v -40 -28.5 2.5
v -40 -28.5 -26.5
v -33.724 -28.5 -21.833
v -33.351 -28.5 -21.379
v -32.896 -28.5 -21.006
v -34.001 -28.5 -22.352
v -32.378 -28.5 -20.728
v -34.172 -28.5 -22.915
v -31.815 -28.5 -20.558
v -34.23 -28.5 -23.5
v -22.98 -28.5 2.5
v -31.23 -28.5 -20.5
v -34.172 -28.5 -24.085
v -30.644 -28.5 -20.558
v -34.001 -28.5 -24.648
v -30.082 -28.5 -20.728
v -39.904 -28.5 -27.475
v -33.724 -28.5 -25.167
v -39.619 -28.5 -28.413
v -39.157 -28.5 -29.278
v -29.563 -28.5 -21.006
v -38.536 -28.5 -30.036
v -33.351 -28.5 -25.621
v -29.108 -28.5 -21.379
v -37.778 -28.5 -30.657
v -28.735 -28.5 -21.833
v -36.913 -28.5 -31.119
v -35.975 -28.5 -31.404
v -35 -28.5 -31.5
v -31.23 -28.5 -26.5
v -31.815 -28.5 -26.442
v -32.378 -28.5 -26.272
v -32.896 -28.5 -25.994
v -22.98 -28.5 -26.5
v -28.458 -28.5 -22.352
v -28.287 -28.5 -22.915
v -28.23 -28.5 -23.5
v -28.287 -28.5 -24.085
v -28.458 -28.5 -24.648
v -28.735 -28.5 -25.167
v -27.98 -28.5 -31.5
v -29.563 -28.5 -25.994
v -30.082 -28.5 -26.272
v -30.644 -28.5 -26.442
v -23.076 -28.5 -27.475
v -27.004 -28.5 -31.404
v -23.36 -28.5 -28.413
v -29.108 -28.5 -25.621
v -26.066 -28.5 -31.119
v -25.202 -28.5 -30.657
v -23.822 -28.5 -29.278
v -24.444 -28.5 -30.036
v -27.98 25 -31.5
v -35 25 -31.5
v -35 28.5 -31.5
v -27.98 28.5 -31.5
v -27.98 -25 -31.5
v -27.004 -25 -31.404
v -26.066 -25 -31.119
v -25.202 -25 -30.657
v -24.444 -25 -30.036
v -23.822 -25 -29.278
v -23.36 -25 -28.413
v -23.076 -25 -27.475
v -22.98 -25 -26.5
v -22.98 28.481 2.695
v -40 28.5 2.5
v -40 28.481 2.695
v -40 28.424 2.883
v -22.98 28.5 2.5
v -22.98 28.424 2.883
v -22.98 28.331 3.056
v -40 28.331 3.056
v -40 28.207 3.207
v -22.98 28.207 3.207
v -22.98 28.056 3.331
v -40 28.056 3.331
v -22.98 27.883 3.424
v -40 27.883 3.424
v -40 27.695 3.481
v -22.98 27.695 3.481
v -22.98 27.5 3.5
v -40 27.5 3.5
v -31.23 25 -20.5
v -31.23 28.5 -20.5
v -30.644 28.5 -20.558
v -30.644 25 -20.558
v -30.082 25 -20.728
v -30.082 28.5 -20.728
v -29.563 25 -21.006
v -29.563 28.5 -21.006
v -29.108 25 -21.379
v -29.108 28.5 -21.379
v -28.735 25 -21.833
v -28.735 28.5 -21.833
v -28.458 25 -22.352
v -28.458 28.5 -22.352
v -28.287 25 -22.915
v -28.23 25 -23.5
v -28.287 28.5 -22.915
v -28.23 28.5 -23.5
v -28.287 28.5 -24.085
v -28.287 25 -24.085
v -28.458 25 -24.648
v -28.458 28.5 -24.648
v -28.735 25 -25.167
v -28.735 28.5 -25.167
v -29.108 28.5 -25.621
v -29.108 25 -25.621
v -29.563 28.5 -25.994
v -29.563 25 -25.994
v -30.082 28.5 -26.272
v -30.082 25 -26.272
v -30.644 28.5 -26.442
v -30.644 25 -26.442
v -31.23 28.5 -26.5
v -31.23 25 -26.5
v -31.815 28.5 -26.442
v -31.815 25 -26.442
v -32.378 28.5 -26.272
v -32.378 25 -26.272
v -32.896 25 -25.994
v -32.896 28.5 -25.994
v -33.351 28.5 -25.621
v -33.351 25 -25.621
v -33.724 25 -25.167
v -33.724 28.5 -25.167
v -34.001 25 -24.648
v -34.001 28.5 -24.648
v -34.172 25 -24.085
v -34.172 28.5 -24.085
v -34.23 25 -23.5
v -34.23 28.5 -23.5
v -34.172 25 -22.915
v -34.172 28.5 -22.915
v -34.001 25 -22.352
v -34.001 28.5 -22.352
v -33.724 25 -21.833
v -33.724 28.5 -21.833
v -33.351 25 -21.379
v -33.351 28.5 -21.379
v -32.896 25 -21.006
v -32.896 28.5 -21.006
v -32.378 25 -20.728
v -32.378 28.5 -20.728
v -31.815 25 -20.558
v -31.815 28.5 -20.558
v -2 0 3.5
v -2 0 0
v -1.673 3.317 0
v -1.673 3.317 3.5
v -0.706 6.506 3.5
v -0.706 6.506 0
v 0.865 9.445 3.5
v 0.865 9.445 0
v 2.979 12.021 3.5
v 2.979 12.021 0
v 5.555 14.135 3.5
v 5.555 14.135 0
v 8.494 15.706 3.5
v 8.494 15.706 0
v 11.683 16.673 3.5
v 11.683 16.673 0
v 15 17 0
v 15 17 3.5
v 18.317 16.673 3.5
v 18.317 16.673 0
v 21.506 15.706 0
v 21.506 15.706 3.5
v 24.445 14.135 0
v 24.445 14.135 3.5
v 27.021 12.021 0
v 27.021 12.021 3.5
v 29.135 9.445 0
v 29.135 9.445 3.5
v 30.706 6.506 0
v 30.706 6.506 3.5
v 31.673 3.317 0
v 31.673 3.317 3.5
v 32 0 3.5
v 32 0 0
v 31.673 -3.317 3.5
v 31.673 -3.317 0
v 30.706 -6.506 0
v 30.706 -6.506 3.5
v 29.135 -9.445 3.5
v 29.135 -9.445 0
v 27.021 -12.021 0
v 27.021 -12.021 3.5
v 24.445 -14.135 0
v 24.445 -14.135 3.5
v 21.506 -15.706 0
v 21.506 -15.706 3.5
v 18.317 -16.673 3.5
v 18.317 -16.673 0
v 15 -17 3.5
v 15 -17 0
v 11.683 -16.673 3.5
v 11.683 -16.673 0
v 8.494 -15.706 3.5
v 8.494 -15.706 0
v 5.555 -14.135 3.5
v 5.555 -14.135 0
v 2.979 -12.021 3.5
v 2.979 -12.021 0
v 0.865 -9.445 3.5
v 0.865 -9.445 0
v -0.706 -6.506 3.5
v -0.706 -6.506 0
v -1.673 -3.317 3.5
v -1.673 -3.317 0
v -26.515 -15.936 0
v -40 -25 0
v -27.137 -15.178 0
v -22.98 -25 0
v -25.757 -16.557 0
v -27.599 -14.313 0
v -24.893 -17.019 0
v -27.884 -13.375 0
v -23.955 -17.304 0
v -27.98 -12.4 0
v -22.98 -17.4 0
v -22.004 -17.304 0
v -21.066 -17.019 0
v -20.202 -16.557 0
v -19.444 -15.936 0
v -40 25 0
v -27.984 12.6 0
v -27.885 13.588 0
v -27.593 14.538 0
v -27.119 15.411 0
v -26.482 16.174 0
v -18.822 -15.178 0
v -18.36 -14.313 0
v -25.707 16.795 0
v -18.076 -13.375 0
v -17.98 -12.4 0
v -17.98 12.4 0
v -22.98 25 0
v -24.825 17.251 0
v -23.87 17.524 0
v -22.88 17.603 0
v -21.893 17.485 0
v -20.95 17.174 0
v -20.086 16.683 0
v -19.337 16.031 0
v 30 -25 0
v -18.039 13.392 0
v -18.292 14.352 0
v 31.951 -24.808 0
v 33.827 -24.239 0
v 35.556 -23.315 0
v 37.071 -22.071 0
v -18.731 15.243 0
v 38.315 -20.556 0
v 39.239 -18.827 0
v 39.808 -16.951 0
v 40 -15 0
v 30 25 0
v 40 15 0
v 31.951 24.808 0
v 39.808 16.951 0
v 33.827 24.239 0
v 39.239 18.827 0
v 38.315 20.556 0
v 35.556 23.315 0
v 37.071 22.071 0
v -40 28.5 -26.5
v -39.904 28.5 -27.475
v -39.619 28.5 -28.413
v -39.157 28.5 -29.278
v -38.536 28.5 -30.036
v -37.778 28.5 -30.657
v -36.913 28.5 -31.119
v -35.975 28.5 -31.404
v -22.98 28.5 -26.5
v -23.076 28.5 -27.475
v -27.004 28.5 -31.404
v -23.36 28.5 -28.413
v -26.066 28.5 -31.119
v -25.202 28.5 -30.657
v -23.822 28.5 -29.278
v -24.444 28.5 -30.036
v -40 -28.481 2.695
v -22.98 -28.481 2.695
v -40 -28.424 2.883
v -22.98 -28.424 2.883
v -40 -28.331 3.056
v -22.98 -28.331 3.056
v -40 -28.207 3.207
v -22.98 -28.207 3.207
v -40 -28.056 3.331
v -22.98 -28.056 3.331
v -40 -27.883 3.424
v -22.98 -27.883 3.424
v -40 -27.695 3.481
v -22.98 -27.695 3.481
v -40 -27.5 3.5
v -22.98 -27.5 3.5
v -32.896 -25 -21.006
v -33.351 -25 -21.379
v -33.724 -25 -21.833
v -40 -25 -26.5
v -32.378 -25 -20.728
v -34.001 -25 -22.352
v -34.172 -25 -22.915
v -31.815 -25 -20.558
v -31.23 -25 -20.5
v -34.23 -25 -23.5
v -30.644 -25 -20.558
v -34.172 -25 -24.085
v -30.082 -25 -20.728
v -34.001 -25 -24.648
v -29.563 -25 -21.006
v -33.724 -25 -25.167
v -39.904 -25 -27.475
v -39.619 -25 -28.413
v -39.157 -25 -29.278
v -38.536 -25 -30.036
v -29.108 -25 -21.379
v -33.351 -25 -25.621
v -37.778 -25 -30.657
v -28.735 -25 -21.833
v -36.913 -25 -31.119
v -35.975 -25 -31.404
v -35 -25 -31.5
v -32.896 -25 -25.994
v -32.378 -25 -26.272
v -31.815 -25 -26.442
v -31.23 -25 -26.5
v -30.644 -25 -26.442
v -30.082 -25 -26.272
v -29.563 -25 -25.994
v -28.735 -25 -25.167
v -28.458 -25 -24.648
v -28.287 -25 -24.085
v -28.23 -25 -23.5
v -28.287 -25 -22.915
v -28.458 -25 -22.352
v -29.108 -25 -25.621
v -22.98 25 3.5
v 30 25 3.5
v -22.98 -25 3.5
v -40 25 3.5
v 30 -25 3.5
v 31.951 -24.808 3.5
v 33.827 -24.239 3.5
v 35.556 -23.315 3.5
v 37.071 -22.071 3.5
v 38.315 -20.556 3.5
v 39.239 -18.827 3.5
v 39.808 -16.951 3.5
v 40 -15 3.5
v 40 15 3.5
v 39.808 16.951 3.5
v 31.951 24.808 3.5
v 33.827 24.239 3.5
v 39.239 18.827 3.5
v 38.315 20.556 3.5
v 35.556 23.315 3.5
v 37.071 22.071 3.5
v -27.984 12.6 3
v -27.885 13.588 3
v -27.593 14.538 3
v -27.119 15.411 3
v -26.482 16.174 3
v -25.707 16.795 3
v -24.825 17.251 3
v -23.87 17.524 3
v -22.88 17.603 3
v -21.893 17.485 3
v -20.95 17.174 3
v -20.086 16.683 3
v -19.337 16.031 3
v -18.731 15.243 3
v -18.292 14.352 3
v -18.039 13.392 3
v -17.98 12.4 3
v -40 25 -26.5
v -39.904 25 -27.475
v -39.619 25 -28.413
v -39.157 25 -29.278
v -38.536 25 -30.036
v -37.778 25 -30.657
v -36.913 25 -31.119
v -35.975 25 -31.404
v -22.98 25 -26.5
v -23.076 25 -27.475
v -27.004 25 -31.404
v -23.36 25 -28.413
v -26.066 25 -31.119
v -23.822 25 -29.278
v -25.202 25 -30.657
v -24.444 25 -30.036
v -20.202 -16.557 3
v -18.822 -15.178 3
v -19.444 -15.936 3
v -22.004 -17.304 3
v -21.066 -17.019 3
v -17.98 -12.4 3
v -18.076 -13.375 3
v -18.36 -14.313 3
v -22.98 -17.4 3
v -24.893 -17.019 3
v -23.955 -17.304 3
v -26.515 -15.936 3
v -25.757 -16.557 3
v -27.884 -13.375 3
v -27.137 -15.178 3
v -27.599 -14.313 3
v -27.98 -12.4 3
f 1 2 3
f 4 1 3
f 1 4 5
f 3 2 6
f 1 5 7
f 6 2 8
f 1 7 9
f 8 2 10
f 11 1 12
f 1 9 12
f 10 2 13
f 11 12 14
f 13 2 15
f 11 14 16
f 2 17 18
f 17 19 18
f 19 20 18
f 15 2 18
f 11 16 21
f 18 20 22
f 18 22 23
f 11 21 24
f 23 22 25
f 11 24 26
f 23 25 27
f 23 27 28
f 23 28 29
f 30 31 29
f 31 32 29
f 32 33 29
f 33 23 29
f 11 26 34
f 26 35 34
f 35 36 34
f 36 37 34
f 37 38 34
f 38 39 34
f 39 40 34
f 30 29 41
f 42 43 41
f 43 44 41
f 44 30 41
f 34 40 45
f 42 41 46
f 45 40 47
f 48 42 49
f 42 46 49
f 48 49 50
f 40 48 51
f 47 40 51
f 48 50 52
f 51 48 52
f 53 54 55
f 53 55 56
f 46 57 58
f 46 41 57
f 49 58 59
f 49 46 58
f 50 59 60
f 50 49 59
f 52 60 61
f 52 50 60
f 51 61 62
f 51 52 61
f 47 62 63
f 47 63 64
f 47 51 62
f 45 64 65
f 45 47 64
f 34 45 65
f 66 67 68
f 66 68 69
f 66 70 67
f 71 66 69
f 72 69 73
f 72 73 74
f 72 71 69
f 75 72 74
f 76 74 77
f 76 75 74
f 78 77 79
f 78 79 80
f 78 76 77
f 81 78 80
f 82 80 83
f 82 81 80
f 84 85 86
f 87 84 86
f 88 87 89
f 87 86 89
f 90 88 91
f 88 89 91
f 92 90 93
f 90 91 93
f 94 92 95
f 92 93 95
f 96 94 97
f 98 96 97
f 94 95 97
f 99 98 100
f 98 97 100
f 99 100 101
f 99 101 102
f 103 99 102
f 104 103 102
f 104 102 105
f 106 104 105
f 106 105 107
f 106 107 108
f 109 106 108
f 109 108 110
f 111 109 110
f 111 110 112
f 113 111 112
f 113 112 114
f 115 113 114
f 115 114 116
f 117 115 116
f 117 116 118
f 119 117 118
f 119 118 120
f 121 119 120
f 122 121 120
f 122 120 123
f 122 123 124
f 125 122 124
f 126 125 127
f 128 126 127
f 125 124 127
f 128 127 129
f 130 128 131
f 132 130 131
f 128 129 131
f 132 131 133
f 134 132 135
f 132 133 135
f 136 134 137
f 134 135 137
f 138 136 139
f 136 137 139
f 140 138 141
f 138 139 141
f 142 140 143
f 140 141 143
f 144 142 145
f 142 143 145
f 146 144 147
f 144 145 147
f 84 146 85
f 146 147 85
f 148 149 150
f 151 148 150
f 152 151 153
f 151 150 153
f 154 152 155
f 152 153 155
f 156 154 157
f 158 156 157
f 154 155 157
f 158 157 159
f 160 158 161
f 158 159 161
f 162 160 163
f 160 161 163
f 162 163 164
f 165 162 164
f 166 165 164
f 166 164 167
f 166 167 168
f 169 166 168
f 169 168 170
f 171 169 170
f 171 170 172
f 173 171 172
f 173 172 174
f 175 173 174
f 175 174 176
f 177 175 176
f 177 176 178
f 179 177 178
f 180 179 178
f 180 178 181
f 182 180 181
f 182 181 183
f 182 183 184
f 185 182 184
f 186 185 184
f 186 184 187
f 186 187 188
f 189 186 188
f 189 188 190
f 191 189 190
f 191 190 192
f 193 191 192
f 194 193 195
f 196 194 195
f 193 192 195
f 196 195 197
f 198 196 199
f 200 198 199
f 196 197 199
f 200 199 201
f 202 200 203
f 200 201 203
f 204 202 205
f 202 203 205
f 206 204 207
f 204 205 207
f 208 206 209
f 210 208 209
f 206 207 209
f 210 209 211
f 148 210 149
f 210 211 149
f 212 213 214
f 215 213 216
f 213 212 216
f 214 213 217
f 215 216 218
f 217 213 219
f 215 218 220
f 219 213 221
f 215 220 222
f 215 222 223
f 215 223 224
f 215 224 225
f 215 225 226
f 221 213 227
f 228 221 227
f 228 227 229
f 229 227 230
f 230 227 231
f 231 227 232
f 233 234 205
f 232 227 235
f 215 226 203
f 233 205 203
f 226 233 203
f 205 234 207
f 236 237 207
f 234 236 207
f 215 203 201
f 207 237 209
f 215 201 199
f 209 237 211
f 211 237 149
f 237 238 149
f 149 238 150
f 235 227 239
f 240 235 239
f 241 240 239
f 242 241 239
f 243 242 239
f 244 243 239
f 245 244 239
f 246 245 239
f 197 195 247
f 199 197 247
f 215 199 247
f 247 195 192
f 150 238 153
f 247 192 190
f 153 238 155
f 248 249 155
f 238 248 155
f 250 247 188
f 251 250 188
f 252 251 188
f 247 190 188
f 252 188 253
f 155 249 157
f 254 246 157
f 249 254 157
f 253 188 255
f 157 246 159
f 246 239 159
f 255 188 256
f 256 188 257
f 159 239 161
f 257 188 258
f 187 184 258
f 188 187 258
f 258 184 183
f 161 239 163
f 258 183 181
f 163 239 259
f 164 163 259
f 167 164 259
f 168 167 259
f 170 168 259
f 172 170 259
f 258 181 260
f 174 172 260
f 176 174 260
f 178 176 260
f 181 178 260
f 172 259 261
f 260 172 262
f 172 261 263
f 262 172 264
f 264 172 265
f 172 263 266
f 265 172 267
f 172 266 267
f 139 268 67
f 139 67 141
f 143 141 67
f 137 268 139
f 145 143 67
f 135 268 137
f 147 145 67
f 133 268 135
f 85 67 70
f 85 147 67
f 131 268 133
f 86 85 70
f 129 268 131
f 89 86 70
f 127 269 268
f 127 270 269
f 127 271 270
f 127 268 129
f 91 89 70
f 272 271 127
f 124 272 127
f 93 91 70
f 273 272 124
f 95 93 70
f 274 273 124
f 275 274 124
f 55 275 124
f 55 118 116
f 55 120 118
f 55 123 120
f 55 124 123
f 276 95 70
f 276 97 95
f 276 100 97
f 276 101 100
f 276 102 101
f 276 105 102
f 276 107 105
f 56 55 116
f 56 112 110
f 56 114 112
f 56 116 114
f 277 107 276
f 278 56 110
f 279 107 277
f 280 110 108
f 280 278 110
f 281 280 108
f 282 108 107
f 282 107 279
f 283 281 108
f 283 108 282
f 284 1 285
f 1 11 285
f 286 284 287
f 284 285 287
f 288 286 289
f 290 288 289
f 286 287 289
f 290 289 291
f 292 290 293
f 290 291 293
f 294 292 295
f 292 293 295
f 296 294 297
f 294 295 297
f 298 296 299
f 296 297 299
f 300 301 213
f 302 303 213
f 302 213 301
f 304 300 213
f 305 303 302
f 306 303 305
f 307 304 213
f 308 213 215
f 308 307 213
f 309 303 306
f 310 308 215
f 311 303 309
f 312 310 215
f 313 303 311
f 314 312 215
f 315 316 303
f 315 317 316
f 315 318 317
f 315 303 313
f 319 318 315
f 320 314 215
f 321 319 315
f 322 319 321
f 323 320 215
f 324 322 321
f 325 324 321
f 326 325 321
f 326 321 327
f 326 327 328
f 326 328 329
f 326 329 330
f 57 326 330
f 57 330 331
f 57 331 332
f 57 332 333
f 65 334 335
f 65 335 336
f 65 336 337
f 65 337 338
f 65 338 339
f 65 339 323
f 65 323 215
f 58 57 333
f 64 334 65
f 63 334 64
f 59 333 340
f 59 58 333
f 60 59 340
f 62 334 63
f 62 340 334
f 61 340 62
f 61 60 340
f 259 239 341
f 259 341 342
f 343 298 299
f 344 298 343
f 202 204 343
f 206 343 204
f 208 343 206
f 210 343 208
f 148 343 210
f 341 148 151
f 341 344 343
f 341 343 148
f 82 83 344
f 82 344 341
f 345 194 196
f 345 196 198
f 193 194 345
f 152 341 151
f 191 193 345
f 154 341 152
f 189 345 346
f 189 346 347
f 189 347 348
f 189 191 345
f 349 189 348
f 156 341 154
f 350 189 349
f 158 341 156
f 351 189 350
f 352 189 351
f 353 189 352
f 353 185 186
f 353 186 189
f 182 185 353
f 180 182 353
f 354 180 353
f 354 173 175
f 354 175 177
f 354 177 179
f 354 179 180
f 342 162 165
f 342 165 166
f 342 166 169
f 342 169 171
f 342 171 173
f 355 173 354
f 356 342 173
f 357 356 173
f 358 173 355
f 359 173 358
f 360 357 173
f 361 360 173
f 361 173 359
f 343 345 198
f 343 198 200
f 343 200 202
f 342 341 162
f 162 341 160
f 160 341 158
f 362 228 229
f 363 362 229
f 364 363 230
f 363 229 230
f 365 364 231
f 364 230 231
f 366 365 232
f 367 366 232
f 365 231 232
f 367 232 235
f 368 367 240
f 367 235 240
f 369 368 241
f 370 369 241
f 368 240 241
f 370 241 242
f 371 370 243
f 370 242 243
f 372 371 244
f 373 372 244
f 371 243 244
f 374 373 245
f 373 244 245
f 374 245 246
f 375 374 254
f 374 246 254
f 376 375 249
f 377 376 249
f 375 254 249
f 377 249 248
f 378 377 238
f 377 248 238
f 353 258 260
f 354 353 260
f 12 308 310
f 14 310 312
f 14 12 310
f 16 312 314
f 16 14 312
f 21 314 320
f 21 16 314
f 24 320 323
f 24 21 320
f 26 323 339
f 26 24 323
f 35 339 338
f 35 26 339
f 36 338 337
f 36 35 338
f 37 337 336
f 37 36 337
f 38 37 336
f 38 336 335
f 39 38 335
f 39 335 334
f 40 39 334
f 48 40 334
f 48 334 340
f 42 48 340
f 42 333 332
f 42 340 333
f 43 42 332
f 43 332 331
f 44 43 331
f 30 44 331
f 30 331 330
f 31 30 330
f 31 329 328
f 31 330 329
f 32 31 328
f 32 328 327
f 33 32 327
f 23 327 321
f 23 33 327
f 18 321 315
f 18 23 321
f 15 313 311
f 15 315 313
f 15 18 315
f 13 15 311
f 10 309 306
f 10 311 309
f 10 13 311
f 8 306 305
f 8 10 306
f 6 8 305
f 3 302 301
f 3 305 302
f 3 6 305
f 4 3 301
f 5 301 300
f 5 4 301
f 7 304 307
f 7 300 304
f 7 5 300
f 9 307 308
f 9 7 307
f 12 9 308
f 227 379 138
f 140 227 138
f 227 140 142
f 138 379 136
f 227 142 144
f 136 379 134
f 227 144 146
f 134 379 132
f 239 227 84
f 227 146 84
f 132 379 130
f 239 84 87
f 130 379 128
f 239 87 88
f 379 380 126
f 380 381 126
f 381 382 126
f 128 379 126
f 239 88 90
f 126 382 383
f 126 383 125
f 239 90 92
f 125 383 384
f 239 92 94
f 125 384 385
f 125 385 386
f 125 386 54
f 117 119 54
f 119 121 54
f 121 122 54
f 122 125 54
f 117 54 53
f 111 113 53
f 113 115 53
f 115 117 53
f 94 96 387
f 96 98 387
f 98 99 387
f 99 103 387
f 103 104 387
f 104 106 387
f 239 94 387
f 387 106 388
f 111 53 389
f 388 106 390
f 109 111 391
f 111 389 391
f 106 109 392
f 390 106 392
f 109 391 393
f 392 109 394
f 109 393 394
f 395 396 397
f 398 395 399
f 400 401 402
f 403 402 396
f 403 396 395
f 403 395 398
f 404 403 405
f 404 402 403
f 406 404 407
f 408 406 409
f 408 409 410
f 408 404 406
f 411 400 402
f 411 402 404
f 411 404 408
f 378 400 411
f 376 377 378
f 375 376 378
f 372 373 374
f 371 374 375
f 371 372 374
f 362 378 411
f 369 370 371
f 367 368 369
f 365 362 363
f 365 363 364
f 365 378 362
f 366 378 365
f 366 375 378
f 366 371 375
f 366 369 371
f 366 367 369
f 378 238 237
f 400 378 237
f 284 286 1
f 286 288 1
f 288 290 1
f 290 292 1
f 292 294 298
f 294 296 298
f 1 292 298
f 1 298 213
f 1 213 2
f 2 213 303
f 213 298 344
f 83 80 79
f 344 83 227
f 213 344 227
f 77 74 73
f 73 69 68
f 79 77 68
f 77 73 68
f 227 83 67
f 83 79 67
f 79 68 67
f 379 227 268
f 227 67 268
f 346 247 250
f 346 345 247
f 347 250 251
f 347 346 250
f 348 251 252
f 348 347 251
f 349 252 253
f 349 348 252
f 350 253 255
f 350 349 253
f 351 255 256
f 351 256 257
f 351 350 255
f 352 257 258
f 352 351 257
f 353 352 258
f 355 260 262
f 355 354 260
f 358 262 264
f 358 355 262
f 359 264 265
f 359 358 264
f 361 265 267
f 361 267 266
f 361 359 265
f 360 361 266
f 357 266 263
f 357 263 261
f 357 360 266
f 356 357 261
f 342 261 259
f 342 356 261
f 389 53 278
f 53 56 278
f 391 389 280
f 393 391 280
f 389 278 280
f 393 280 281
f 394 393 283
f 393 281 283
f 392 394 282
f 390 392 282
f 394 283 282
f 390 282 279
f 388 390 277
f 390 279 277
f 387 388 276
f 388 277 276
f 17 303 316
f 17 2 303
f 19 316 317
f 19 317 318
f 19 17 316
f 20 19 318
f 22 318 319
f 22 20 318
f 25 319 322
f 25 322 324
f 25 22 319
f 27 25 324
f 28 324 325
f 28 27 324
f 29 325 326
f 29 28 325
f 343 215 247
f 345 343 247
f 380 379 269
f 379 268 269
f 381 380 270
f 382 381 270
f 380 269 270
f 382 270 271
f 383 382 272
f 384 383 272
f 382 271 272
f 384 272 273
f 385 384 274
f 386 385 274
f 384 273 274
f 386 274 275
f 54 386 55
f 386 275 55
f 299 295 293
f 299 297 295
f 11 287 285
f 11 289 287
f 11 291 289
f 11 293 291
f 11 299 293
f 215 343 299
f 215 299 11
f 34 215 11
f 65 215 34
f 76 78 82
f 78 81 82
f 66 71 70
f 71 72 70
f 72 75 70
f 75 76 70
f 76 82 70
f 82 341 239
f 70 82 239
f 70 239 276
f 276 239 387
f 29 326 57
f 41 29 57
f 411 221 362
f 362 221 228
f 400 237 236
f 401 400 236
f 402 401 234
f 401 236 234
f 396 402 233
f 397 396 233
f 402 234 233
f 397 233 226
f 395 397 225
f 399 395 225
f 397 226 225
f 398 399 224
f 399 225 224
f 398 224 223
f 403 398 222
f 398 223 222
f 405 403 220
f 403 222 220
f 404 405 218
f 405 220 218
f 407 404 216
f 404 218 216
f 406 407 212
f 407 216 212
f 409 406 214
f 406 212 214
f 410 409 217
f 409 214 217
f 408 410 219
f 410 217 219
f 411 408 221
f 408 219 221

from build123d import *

# Parameters (mm, degrees)
SKETCH_1_W          = 80
SKETCH_1_H          = 50
EXTRUDE_1_DEPTH     = 3.5
CUT_EXTRUDE_1_DEPTH = 3
SKETCH_12_W         = 17.020417597
SKETCH_12_H         = 35
EXTRUDE_2_DEPTH     = 3.5
FILLET_1_R          = 1
FILLET_2_R          = 5
SKETCH_13_R         = 3
CUT_EXTRUDE_2_DEPTH = 10
SKETCH_14_R         = 17
CUT_EXTRUDE_3_DEPTH = 8
FILLET_3_R          = 10


with BuildPart() as part:
    # 草图1 → 凸台-拉伸1 (new body)
    with BuildSketch(Plane.XY):
        Rectangle(SKETCH_1_W, SKETCH_1_H)
    extrude(amount=EXTRUDE_1_DEPTH)

    # 草图2 → 切除-拉伸1 (cut)
    with BuildSketch(Plane(origin=(0, 0, 0), x_dir=(-1, 0, 0), z_dir=(0, 0, -1))):
        with BuildLine():
            Line((27.979582403, -12.4), (27.983580804, 12.6))
            ThreePointArc((27.983580804, 12.6), (22.879562421, 17.602998701), (17.979582403, 12.4))
            Line((17.979582403, 12.4), (17.979582403, -12.4))
            ThreePointArc((17.979582403, -12.4), (22.979582403, -17.4), (27.979582403, -12.4))
        make_face()
    extrude(amount=-CUT_EXTRUDE_1_DEPTH, mode=Mode.SUBTRACT)

    # 草图12 → 凸台-拉伸2 (add)
    with BuildSketch(Plane(origin=(0, 25, 0), x_dir=(1, 0, 0), z_dir=(0, 1, 0))):
        with Locations((-31.489791202, 14)):
            Rectangle(SKETCH_12_W, SKETCH_12_H)
    extrude_2 = extrude(amount=EXTRUDE_2_DEPTH)

    # 镜向1: 凸台-拉伸2 across plane
    add(extrude_2.mirror(Plane.ZX))

    # 圆角1
    fillet_1_edges = [part.edges().sort_by_distance(p)[0] for p in [
        (-31.489791201, 28.5, 3.5),
        (-31.489791201, -28.5, 3.5),
    ]]
    fillet(fillet_1_edges, radius=FILLET_1_R)

    # 圆角2
    fillet_2_edges = [part.edges().sort_by_distance(p)[0] for p in [
        (-22.979582403, -26.75, -31.5),
        (-40, -26.75, -31.5),
        (-40, 26.75, -31.5),
        (-22.979582403, 26.75, -31.5),
    ]]
    fillet(fillet_2_edges, radius=FILLET_2_R)

    # 草图13 → 切除-拉伸2 (cut)
    with BuildSketch(Plane(origin=(0, 28.5, 0), x_dir=(1, 0, 0), z_dir=(0, 1, 0))):
        with Locations(Location((-31.229582403, 23.5, 0), (0, 0, 270))):
            Circle(SKETCH_13_R)
    cut_extrude_2 = extrude(amount=-CUT_EXTRUDE_2_DEPTH, mode=Mode.SUBTRACT)

    # 镜向2: 切除-拉伸2 across plane
    add(cut_extrude_2.mirror(Plane.ZX), mode=Mode.SUBTRACT)

    # 草图14 → 切除-拉伸3 (cut)
    with BuildSketch(Plane(origin=(0, 0, 0), x_dir=(-1, 0, 0), z_dir=(0, 0, -1))):
        with Locations((-15, 0)):
            Circle(SKETCH_14_R)
    extrude(amount=-CUT_EXTRUDE_3_DEPTH, mode=Mode.SUBTRACT)

    # 圆角3
    fillet_3_edges = [part.edges().sort_by_distance(p)[0] for p in [
        (40, -25, 1.75),
        (40, 25, 1.75),
    ]]
    fillet(fillet_3_edges, radius=FILLET_3_R)


solid = part.part
